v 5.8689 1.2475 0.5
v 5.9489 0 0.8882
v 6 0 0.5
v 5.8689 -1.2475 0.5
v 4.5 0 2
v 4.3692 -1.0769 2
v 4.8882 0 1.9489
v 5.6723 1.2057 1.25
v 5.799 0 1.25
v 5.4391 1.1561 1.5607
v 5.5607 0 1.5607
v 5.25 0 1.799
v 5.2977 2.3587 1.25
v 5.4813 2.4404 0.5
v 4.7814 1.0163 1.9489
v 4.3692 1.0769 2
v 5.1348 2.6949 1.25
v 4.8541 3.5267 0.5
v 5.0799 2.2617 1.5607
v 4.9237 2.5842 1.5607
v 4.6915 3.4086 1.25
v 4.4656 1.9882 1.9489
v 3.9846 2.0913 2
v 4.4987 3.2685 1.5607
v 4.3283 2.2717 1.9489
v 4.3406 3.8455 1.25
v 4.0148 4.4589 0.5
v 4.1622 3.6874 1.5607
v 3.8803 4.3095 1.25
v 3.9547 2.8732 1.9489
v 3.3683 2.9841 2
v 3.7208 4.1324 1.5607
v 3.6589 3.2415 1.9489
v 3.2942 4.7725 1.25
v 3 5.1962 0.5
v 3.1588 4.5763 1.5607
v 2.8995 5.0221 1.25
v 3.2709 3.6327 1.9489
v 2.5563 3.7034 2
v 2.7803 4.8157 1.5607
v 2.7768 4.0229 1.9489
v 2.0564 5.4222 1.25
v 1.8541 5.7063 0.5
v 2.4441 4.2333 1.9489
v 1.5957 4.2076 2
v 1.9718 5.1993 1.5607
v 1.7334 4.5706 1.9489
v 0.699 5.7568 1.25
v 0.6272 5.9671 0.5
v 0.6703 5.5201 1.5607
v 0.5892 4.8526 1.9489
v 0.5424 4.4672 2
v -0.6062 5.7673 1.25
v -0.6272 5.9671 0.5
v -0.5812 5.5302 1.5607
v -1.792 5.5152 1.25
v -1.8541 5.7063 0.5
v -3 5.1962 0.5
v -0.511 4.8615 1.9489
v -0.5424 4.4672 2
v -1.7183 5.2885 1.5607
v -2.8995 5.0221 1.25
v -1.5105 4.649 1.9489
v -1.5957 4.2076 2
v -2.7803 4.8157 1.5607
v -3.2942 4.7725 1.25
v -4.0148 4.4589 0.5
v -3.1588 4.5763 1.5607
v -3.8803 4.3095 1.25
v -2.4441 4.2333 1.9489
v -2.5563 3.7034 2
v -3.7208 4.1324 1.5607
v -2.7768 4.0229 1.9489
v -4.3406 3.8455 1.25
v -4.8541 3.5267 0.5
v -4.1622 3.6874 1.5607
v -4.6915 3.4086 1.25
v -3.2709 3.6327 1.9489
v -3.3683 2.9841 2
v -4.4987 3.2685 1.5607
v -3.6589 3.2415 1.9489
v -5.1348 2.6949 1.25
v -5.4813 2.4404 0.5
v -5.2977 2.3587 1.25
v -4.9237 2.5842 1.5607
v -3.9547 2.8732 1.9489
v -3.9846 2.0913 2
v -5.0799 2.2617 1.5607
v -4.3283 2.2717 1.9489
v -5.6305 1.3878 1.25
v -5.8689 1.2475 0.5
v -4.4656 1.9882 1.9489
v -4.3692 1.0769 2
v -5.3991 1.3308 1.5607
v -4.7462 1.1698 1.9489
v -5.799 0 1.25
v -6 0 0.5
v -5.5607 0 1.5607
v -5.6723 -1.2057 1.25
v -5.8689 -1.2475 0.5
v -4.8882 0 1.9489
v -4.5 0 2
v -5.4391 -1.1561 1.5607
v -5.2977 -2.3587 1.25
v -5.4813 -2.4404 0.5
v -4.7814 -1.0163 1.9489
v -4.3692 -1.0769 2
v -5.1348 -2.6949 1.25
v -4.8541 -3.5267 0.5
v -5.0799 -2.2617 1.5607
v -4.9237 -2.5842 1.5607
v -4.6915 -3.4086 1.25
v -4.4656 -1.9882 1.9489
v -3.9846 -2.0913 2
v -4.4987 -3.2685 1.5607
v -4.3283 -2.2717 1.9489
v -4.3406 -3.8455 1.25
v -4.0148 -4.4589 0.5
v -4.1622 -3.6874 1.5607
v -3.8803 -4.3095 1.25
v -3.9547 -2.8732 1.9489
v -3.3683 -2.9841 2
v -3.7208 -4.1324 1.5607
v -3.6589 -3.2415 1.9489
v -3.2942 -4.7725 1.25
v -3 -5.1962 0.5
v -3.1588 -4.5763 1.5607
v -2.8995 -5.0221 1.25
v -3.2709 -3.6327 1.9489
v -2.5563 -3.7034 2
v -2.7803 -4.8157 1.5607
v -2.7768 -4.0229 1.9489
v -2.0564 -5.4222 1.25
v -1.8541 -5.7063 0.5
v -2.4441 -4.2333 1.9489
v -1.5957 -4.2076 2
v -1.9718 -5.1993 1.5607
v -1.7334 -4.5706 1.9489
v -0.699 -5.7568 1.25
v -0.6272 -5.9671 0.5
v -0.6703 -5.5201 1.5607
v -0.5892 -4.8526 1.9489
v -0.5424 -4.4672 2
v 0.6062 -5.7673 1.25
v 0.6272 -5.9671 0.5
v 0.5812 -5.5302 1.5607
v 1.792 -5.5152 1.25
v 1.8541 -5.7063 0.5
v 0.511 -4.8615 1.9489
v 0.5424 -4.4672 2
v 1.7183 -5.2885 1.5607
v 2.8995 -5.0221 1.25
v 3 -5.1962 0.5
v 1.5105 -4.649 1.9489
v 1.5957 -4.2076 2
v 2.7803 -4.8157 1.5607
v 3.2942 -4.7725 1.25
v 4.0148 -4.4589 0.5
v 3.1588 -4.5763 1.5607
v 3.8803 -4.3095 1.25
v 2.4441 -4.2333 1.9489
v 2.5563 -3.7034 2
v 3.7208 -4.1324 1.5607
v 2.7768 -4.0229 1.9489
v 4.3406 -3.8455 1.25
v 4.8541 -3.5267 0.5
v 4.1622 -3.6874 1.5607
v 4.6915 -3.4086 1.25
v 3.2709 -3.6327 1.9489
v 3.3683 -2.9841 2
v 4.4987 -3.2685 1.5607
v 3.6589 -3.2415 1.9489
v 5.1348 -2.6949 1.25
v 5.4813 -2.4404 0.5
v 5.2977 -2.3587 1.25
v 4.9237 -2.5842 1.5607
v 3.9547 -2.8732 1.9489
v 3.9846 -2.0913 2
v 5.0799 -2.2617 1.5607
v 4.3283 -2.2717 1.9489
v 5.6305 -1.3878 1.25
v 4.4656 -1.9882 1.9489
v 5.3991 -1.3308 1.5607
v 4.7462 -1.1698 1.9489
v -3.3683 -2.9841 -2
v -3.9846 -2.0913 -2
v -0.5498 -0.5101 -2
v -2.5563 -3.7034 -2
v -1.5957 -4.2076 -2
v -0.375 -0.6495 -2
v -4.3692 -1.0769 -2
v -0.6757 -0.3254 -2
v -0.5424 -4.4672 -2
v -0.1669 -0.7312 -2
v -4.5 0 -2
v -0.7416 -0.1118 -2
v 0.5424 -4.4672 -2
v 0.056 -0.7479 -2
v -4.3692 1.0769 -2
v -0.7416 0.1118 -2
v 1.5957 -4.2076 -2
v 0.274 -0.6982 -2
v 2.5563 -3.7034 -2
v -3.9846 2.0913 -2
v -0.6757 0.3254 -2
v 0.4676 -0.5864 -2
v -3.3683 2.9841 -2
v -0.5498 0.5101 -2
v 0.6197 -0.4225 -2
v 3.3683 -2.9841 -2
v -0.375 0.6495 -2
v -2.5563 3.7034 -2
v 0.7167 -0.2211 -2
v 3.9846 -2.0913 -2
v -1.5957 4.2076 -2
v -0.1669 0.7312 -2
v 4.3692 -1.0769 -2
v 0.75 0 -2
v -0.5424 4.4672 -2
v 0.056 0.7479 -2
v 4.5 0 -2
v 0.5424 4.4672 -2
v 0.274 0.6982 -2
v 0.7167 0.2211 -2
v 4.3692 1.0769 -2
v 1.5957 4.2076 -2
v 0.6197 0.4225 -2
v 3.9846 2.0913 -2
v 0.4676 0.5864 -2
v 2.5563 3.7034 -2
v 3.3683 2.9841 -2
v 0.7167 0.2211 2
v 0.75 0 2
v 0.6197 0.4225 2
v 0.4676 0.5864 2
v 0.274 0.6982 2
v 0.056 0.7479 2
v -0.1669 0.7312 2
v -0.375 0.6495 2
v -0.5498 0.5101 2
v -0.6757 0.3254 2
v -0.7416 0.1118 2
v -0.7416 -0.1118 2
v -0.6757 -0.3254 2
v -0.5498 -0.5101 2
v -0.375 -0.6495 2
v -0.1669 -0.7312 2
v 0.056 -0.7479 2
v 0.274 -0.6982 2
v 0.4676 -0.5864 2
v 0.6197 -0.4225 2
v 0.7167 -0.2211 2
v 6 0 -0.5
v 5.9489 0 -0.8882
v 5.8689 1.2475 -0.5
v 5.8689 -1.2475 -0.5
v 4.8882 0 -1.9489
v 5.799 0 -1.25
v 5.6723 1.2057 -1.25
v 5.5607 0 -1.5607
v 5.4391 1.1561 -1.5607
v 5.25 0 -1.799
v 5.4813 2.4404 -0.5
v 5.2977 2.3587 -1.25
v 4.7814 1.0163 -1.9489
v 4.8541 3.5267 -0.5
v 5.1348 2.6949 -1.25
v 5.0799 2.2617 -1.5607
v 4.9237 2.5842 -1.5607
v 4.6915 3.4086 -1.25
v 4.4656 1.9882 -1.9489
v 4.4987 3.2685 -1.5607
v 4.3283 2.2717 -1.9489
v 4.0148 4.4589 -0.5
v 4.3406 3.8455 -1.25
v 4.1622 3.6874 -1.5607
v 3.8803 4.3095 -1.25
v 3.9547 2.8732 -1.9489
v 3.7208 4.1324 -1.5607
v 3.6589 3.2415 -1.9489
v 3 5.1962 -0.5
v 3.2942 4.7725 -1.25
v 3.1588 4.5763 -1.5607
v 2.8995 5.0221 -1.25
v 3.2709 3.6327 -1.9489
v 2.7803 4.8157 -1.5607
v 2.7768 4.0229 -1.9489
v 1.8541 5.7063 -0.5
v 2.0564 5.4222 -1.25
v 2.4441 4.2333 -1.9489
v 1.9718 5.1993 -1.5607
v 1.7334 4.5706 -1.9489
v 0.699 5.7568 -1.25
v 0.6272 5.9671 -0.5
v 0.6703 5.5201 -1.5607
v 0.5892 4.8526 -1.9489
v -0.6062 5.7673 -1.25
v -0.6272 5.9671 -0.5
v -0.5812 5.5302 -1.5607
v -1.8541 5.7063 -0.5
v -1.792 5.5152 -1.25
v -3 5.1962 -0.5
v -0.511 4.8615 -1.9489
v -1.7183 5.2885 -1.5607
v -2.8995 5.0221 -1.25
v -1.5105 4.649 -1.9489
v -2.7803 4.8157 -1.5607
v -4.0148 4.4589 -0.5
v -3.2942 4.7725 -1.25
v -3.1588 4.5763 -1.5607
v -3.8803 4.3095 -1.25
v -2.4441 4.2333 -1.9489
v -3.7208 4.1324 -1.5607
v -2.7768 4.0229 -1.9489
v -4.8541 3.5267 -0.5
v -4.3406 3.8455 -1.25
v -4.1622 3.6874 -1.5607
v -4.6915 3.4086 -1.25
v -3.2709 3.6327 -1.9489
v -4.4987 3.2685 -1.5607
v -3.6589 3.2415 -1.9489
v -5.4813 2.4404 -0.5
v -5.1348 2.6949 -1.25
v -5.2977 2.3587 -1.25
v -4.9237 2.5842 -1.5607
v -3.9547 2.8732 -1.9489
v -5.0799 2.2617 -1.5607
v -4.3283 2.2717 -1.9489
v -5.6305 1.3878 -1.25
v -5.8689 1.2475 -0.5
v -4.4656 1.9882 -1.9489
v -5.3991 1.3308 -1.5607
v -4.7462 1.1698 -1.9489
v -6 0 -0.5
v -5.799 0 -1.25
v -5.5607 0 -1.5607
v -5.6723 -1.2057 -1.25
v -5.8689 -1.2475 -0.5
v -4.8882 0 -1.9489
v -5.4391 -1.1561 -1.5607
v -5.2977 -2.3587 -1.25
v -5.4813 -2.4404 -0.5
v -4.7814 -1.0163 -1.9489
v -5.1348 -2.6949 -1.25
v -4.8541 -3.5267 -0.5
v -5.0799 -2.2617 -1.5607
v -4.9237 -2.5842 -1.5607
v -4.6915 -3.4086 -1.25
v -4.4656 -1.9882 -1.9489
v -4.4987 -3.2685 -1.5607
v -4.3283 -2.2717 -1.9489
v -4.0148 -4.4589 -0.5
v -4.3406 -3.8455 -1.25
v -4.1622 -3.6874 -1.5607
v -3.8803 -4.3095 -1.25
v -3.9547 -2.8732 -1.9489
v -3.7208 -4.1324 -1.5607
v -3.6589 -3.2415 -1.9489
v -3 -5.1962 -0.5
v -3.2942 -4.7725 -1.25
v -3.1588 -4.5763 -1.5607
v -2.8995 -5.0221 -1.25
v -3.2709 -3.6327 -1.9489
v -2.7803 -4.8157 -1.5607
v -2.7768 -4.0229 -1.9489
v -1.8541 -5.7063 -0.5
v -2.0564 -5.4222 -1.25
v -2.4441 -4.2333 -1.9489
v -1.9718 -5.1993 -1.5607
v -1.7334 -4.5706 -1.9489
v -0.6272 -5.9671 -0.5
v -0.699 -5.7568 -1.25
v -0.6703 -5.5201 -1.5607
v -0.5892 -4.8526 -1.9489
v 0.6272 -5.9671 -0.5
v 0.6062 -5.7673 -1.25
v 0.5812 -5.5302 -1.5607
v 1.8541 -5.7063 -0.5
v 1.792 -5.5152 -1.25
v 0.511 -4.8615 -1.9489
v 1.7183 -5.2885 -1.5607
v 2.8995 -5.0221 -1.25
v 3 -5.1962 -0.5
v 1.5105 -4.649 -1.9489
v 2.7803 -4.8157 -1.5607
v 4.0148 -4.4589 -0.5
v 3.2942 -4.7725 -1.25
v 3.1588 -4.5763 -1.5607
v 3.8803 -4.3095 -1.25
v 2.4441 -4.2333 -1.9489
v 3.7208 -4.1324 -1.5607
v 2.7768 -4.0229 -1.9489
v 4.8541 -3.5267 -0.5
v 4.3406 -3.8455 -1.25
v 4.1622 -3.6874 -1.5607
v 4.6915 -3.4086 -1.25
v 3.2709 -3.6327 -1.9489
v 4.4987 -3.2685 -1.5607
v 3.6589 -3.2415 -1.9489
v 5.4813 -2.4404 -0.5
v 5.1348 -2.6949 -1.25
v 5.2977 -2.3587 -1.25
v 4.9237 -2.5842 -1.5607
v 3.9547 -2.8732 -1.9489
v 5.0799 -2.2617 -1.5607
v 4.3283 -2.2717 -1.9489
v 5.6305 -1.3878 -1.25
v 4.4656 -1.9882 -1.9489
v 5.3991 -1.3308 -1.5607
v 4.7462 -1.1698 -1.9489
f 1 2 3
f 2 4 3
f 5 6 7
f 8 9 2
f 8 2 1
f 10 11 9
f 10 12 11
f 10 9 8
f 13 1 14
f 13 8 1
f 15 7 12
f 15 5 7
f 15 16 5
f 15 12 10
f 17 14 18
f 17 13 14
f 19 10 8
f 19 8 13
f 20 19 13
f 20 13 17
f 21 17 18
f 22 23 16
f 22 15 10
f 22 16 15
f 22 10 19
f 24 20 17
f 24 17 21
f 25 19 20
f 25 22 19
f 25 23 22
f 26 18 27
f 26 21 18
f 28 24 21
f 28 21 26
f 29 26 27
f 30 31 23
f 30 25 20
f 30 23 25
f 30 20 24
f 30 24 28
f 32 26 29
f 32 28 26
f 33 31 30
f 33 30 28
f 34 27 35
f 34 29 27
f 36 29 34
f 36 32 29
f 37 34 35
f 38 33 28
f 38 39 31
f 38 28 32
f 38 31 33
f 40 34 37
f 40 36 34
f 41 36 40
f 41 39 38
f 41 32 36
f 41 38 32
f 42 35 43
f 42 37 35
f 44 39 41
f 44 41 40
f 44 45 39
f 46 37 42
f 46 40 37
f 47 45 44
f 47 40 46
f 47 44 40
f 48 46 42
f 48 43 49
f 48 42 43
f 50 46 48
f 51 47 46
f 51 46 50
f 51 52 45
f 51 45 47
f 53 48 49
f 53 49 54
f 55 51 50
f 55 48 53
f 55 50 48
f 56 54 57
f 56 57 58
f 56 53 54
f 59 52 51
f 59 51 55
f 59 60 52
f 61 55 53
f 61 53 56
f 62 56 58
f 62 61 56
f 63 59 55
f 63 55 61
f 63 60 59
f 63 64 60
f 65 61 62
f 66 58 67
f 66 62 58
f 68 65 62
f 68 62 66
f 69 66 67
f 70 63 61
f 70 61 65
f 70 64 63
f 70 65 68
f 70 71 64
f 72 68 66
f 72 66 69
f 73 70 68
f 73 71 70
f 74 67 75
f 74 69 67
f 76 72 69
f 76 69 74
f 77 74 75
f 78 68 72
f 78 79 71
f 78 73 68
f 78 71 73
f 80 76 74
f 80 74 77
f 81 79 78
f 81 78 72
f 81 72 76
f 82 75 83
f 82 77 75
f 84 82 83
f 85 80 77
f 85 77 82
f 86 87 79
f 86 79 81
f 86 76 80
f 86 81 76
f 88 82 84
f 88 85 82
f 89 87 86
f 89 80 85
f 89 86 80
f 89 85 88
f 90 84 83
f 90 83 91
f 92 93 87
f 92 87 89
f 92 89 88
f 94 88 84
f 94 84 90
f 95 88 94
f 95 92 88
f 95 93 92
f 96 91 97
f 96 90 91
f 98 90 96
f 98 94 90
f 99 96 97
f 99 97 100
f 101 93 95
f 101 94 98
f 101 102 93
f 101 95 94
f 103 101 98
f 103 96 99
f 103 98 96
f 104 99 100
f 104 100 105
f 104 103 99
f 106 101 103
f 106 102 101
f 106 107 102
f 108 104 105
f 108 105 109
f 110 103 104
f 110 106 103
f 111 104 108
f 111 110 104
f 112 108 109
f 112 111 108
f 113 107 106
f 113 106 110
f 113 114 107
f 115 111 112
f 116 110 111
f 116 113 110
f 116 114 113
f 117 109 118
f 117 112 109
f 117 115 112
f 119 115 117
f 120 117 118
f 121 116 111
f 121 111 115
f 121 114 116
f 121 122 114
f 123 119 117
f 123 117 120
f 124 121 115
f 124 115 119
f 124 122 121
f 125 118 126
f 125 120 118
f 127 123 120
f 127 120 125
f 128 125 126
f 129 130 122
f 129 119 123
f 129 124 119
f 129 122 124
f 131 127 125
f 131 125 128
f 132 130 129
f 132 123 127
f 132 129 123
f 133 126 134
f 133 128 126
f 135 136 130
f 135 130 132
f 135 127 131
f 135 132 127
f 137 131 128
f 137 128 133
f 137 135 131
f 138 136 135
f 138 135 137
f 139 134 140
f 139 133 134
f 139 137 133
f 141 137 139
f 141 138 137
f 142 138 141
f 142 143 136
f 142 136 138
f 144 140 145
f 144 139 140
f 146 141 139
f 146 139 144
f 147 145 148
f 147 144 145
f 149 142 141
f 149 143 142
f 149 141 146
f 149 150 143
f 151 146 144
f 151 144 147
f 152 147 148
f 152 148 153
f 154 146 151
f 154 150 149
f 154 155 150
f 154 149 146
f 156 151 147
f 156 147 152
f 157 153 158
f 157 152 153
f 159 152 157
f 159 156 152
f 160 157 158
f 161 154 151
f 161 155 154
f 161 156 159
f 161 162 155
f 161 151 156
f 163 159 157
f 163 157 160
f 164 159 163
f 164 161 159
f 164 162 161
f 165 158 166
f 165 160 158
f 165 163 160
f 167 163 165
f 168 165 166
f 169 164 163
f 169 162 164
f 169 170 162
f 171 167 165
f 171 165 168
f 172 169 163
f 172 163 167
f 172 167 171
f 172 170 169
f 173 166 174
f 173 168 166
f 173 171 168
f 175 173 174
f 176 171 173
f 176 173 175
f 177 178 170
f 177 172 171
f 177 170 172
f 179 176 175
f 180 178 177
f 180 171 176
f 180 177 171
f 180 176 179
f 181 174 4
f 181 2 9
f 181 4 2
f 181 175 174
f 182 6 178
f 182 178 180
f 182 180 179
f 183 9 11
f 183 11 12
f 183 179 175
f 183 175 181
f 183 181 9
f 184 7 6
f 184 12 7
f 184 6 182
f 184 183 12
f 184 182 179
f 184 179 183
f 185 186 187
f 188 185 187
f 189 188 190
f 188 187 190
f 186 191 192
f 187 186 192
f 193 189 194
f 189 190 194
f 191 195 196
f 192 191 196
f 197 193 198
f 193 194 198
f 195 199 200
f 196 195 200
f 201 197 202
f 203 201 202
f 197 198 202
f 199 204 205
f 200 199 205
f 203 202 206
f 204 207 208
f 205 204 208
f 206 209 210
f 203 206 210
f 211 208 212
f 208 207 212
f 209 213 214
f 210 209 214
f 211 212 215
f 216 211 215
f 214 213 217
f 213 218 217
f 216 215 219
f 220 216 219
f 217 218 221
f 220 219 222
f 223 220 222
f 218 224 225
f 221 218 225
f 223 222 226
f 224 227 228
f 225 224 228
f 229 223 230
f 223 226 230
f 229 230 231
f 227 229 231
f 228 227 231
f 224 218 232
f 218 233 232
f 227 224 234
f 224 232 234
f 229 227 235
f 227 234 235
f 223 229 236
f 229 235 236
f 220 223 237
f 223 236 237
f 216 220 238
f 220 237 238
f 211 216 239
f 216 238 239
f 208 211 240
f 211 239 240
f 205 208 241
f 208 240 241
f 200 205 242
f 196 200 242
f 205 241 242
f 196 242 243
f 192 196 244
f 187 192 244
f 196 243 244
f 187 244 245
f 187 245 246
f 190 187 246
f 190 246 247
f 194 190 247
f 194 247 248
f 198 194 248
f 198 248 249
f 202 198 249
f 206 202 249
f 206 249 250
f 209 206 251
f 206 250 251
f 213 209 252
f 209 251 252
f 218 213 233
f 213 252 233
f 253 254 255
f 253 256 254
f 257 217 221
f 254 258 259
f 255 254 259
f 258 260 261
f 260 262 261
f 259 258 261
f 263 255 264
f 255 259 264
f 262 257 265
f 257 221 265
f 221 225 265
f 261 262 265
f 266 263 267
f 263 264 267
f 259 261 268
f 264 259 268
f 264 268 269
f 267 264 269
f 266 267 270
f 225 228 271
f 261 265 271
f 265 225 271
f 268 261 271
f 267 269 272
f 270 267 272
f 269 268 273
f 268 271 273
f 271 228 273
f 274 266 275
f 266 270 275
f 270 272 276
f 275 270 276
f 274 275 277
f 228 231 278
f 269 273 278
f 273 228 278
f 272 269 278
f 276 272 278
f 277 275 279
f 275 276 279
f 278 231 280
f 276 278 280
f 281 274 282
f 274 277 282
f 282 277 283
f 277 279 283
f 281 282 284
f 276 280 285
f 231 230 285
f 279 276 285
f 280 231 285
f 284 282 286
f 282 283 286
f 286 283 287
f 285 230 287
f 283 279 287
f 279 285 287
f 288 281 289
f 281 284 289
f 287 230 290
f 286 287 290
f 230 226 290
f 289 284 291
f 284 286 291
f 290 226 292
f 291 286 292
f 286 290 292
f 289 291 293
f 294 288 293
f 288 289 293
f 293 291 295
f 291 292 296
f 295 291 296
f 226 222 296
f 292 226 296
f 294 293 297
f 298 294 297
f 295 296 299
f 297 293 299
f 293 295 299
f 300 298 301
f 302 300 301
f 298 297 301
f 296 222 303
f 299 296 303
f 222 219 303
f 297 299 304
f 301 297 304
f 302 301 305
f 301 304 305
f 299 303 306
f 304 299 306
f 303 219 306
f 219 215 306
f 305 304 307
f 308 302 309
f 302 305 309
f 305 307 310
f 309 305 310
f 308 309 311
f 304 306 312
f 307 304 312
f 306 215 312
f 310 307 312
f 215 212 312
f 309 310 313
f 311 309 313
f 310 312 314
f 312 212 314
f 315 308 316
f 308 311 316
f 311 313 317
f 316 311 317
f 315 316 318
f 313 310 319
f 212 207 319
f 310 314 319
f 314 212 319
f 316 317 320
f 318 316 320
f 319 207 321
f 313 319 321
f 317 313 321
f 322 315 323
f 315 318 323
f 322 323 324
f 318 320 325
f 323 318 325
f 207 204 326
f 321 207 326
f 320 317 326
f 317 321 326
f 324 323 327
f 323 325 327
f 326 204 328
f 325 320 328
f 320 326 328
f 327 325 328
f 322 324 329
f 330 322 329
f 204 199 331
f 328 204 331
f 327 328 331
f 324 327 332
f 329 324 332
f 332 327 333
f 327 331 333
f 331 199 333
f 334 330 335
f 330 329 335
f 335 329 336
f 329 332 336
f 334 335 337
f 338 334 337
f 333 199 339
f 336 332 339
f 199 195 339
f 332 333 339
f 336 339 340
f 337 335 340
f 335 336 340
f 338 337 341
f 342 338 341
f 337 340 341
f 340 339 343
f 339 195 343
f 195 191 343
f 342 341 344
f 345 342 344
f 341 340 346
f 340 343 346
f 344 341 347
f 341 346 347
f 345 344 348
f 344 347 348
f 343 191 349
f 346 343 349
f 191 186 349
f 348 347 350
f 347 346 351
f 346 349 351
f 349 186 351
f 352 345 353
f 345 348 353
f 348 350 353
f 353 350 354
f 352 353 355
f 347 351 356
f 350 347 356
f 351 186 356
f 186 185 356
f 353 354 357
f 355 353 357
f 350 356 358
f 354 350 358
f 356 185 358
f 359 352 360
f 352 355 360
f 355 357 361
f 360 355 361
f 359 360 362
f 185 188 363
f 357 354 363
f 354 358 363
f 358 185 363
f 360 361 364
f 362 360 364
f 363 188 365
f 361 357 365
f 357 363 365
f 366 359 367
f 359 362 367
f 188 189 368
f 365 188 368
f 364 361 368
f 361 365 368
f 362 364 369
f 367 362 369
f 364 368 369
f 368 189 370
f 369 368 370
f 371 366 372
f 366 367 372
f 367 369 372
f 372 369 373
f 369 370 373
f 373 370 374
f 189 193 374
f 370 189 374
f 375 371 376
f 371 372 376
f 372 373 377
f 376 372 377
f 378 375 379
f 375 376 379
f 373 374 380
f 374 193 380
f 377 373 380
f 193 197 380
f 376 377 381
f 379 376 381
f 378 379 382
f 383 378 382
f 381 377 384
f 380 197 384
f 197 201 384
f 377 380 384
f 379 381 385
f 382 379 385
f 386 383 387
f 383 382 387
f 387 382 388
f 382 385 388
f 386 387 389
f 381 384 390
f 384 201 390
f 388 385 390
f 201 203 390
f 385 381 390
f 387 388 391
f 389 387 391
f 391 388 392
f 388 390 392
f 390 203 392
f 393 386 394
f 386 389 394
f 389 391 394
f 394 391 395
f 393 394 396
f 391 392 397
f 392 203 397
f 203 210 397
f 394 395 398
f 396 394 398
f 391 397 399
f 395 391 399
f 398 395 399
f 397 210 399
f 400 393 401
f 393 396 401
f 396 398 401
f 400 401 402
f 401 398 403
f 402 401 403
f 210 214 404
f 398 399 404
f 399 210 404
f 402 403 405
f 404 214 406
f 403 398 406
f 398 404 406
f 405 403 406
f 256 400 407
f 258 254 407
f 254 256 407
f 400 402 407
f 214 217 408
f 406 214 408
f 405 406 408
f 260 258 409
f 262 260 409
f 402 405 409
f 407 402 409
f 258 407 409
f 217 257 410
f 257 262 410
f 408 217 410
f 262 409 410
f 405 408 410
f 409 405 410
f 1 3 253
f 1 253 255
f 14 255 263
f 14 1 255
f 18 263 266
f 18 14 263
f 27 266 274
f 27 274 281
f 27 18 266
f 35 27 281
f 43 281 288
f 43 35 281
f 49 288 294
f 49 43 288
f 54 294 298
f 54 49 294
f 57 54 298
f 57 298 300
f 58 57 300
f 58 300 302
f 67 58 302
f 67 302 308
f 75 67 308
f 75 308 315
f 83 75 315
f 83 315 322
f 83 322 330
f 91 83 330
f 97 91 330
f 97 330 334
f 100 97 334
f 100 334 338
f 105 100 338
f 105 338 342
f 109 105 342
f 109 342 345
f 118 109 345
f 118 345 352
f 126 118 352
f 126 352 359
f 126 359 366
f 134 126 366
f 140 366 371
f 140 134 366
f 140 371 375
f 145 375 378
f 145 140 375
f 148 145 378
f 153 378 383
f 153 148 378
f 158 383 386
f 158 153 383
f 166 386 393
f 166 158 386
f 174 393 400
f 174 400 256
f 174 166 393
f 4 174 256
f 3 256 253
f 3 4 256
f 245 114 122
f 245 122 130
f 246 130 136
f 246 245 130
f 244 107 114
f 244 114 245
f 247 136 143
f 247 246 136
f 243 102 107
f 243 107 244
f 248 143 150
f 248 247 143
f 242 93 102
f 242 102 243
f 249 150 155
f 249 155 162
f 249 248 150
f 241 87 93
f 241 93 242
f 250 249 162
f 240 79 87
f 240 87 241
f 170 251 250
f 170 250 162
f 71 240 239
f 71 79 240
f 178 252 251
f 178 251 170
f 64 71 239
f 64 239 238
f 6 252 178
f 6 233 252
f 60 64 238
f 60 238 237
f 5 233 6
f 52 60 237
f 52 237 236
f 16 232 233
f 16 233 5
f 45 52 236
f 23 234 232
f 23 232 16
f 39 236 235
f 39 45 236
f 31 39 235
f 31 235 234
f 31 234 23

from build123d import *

# Parameters (mm, degrees)
SKETCH1_R           = 6
BOSS_EXTRUDE1_DEPTH = 2
SKETCH2_R           = 0.75
CUT_EXTRUDE1_DEPTH  = 2
FILLET1_R           = 1.5


with BuildPart() as part:
    # Sketch1 → Boss-Extrude1 (new, symmetric)
    with BuildSketch(Plane.XY):
        Circle(SKETCH1_R)
    extrude(amount=BOSS_EXTRUDE1_DEPTH, both=True)

    # Sketch2 → Cut-Extrude1 (cut, symmetric)
    with BuildSketch(Plane.XY):
        Circle(SKETCH2_R)
    extrude(amount=CUT_EXTRUDE1_DEPTH, both=True, mode=Mode.SUBTRACT)

    # Fillet1
    fillet1_edges = [part.edges().sort_by_distance(p)[0] for p in [
        (-6, 0, -2),
        (-6, 0, 2),
    ]]
    fillet(fillet1_edges, radius=FILLET1_R)


solid = part.part
